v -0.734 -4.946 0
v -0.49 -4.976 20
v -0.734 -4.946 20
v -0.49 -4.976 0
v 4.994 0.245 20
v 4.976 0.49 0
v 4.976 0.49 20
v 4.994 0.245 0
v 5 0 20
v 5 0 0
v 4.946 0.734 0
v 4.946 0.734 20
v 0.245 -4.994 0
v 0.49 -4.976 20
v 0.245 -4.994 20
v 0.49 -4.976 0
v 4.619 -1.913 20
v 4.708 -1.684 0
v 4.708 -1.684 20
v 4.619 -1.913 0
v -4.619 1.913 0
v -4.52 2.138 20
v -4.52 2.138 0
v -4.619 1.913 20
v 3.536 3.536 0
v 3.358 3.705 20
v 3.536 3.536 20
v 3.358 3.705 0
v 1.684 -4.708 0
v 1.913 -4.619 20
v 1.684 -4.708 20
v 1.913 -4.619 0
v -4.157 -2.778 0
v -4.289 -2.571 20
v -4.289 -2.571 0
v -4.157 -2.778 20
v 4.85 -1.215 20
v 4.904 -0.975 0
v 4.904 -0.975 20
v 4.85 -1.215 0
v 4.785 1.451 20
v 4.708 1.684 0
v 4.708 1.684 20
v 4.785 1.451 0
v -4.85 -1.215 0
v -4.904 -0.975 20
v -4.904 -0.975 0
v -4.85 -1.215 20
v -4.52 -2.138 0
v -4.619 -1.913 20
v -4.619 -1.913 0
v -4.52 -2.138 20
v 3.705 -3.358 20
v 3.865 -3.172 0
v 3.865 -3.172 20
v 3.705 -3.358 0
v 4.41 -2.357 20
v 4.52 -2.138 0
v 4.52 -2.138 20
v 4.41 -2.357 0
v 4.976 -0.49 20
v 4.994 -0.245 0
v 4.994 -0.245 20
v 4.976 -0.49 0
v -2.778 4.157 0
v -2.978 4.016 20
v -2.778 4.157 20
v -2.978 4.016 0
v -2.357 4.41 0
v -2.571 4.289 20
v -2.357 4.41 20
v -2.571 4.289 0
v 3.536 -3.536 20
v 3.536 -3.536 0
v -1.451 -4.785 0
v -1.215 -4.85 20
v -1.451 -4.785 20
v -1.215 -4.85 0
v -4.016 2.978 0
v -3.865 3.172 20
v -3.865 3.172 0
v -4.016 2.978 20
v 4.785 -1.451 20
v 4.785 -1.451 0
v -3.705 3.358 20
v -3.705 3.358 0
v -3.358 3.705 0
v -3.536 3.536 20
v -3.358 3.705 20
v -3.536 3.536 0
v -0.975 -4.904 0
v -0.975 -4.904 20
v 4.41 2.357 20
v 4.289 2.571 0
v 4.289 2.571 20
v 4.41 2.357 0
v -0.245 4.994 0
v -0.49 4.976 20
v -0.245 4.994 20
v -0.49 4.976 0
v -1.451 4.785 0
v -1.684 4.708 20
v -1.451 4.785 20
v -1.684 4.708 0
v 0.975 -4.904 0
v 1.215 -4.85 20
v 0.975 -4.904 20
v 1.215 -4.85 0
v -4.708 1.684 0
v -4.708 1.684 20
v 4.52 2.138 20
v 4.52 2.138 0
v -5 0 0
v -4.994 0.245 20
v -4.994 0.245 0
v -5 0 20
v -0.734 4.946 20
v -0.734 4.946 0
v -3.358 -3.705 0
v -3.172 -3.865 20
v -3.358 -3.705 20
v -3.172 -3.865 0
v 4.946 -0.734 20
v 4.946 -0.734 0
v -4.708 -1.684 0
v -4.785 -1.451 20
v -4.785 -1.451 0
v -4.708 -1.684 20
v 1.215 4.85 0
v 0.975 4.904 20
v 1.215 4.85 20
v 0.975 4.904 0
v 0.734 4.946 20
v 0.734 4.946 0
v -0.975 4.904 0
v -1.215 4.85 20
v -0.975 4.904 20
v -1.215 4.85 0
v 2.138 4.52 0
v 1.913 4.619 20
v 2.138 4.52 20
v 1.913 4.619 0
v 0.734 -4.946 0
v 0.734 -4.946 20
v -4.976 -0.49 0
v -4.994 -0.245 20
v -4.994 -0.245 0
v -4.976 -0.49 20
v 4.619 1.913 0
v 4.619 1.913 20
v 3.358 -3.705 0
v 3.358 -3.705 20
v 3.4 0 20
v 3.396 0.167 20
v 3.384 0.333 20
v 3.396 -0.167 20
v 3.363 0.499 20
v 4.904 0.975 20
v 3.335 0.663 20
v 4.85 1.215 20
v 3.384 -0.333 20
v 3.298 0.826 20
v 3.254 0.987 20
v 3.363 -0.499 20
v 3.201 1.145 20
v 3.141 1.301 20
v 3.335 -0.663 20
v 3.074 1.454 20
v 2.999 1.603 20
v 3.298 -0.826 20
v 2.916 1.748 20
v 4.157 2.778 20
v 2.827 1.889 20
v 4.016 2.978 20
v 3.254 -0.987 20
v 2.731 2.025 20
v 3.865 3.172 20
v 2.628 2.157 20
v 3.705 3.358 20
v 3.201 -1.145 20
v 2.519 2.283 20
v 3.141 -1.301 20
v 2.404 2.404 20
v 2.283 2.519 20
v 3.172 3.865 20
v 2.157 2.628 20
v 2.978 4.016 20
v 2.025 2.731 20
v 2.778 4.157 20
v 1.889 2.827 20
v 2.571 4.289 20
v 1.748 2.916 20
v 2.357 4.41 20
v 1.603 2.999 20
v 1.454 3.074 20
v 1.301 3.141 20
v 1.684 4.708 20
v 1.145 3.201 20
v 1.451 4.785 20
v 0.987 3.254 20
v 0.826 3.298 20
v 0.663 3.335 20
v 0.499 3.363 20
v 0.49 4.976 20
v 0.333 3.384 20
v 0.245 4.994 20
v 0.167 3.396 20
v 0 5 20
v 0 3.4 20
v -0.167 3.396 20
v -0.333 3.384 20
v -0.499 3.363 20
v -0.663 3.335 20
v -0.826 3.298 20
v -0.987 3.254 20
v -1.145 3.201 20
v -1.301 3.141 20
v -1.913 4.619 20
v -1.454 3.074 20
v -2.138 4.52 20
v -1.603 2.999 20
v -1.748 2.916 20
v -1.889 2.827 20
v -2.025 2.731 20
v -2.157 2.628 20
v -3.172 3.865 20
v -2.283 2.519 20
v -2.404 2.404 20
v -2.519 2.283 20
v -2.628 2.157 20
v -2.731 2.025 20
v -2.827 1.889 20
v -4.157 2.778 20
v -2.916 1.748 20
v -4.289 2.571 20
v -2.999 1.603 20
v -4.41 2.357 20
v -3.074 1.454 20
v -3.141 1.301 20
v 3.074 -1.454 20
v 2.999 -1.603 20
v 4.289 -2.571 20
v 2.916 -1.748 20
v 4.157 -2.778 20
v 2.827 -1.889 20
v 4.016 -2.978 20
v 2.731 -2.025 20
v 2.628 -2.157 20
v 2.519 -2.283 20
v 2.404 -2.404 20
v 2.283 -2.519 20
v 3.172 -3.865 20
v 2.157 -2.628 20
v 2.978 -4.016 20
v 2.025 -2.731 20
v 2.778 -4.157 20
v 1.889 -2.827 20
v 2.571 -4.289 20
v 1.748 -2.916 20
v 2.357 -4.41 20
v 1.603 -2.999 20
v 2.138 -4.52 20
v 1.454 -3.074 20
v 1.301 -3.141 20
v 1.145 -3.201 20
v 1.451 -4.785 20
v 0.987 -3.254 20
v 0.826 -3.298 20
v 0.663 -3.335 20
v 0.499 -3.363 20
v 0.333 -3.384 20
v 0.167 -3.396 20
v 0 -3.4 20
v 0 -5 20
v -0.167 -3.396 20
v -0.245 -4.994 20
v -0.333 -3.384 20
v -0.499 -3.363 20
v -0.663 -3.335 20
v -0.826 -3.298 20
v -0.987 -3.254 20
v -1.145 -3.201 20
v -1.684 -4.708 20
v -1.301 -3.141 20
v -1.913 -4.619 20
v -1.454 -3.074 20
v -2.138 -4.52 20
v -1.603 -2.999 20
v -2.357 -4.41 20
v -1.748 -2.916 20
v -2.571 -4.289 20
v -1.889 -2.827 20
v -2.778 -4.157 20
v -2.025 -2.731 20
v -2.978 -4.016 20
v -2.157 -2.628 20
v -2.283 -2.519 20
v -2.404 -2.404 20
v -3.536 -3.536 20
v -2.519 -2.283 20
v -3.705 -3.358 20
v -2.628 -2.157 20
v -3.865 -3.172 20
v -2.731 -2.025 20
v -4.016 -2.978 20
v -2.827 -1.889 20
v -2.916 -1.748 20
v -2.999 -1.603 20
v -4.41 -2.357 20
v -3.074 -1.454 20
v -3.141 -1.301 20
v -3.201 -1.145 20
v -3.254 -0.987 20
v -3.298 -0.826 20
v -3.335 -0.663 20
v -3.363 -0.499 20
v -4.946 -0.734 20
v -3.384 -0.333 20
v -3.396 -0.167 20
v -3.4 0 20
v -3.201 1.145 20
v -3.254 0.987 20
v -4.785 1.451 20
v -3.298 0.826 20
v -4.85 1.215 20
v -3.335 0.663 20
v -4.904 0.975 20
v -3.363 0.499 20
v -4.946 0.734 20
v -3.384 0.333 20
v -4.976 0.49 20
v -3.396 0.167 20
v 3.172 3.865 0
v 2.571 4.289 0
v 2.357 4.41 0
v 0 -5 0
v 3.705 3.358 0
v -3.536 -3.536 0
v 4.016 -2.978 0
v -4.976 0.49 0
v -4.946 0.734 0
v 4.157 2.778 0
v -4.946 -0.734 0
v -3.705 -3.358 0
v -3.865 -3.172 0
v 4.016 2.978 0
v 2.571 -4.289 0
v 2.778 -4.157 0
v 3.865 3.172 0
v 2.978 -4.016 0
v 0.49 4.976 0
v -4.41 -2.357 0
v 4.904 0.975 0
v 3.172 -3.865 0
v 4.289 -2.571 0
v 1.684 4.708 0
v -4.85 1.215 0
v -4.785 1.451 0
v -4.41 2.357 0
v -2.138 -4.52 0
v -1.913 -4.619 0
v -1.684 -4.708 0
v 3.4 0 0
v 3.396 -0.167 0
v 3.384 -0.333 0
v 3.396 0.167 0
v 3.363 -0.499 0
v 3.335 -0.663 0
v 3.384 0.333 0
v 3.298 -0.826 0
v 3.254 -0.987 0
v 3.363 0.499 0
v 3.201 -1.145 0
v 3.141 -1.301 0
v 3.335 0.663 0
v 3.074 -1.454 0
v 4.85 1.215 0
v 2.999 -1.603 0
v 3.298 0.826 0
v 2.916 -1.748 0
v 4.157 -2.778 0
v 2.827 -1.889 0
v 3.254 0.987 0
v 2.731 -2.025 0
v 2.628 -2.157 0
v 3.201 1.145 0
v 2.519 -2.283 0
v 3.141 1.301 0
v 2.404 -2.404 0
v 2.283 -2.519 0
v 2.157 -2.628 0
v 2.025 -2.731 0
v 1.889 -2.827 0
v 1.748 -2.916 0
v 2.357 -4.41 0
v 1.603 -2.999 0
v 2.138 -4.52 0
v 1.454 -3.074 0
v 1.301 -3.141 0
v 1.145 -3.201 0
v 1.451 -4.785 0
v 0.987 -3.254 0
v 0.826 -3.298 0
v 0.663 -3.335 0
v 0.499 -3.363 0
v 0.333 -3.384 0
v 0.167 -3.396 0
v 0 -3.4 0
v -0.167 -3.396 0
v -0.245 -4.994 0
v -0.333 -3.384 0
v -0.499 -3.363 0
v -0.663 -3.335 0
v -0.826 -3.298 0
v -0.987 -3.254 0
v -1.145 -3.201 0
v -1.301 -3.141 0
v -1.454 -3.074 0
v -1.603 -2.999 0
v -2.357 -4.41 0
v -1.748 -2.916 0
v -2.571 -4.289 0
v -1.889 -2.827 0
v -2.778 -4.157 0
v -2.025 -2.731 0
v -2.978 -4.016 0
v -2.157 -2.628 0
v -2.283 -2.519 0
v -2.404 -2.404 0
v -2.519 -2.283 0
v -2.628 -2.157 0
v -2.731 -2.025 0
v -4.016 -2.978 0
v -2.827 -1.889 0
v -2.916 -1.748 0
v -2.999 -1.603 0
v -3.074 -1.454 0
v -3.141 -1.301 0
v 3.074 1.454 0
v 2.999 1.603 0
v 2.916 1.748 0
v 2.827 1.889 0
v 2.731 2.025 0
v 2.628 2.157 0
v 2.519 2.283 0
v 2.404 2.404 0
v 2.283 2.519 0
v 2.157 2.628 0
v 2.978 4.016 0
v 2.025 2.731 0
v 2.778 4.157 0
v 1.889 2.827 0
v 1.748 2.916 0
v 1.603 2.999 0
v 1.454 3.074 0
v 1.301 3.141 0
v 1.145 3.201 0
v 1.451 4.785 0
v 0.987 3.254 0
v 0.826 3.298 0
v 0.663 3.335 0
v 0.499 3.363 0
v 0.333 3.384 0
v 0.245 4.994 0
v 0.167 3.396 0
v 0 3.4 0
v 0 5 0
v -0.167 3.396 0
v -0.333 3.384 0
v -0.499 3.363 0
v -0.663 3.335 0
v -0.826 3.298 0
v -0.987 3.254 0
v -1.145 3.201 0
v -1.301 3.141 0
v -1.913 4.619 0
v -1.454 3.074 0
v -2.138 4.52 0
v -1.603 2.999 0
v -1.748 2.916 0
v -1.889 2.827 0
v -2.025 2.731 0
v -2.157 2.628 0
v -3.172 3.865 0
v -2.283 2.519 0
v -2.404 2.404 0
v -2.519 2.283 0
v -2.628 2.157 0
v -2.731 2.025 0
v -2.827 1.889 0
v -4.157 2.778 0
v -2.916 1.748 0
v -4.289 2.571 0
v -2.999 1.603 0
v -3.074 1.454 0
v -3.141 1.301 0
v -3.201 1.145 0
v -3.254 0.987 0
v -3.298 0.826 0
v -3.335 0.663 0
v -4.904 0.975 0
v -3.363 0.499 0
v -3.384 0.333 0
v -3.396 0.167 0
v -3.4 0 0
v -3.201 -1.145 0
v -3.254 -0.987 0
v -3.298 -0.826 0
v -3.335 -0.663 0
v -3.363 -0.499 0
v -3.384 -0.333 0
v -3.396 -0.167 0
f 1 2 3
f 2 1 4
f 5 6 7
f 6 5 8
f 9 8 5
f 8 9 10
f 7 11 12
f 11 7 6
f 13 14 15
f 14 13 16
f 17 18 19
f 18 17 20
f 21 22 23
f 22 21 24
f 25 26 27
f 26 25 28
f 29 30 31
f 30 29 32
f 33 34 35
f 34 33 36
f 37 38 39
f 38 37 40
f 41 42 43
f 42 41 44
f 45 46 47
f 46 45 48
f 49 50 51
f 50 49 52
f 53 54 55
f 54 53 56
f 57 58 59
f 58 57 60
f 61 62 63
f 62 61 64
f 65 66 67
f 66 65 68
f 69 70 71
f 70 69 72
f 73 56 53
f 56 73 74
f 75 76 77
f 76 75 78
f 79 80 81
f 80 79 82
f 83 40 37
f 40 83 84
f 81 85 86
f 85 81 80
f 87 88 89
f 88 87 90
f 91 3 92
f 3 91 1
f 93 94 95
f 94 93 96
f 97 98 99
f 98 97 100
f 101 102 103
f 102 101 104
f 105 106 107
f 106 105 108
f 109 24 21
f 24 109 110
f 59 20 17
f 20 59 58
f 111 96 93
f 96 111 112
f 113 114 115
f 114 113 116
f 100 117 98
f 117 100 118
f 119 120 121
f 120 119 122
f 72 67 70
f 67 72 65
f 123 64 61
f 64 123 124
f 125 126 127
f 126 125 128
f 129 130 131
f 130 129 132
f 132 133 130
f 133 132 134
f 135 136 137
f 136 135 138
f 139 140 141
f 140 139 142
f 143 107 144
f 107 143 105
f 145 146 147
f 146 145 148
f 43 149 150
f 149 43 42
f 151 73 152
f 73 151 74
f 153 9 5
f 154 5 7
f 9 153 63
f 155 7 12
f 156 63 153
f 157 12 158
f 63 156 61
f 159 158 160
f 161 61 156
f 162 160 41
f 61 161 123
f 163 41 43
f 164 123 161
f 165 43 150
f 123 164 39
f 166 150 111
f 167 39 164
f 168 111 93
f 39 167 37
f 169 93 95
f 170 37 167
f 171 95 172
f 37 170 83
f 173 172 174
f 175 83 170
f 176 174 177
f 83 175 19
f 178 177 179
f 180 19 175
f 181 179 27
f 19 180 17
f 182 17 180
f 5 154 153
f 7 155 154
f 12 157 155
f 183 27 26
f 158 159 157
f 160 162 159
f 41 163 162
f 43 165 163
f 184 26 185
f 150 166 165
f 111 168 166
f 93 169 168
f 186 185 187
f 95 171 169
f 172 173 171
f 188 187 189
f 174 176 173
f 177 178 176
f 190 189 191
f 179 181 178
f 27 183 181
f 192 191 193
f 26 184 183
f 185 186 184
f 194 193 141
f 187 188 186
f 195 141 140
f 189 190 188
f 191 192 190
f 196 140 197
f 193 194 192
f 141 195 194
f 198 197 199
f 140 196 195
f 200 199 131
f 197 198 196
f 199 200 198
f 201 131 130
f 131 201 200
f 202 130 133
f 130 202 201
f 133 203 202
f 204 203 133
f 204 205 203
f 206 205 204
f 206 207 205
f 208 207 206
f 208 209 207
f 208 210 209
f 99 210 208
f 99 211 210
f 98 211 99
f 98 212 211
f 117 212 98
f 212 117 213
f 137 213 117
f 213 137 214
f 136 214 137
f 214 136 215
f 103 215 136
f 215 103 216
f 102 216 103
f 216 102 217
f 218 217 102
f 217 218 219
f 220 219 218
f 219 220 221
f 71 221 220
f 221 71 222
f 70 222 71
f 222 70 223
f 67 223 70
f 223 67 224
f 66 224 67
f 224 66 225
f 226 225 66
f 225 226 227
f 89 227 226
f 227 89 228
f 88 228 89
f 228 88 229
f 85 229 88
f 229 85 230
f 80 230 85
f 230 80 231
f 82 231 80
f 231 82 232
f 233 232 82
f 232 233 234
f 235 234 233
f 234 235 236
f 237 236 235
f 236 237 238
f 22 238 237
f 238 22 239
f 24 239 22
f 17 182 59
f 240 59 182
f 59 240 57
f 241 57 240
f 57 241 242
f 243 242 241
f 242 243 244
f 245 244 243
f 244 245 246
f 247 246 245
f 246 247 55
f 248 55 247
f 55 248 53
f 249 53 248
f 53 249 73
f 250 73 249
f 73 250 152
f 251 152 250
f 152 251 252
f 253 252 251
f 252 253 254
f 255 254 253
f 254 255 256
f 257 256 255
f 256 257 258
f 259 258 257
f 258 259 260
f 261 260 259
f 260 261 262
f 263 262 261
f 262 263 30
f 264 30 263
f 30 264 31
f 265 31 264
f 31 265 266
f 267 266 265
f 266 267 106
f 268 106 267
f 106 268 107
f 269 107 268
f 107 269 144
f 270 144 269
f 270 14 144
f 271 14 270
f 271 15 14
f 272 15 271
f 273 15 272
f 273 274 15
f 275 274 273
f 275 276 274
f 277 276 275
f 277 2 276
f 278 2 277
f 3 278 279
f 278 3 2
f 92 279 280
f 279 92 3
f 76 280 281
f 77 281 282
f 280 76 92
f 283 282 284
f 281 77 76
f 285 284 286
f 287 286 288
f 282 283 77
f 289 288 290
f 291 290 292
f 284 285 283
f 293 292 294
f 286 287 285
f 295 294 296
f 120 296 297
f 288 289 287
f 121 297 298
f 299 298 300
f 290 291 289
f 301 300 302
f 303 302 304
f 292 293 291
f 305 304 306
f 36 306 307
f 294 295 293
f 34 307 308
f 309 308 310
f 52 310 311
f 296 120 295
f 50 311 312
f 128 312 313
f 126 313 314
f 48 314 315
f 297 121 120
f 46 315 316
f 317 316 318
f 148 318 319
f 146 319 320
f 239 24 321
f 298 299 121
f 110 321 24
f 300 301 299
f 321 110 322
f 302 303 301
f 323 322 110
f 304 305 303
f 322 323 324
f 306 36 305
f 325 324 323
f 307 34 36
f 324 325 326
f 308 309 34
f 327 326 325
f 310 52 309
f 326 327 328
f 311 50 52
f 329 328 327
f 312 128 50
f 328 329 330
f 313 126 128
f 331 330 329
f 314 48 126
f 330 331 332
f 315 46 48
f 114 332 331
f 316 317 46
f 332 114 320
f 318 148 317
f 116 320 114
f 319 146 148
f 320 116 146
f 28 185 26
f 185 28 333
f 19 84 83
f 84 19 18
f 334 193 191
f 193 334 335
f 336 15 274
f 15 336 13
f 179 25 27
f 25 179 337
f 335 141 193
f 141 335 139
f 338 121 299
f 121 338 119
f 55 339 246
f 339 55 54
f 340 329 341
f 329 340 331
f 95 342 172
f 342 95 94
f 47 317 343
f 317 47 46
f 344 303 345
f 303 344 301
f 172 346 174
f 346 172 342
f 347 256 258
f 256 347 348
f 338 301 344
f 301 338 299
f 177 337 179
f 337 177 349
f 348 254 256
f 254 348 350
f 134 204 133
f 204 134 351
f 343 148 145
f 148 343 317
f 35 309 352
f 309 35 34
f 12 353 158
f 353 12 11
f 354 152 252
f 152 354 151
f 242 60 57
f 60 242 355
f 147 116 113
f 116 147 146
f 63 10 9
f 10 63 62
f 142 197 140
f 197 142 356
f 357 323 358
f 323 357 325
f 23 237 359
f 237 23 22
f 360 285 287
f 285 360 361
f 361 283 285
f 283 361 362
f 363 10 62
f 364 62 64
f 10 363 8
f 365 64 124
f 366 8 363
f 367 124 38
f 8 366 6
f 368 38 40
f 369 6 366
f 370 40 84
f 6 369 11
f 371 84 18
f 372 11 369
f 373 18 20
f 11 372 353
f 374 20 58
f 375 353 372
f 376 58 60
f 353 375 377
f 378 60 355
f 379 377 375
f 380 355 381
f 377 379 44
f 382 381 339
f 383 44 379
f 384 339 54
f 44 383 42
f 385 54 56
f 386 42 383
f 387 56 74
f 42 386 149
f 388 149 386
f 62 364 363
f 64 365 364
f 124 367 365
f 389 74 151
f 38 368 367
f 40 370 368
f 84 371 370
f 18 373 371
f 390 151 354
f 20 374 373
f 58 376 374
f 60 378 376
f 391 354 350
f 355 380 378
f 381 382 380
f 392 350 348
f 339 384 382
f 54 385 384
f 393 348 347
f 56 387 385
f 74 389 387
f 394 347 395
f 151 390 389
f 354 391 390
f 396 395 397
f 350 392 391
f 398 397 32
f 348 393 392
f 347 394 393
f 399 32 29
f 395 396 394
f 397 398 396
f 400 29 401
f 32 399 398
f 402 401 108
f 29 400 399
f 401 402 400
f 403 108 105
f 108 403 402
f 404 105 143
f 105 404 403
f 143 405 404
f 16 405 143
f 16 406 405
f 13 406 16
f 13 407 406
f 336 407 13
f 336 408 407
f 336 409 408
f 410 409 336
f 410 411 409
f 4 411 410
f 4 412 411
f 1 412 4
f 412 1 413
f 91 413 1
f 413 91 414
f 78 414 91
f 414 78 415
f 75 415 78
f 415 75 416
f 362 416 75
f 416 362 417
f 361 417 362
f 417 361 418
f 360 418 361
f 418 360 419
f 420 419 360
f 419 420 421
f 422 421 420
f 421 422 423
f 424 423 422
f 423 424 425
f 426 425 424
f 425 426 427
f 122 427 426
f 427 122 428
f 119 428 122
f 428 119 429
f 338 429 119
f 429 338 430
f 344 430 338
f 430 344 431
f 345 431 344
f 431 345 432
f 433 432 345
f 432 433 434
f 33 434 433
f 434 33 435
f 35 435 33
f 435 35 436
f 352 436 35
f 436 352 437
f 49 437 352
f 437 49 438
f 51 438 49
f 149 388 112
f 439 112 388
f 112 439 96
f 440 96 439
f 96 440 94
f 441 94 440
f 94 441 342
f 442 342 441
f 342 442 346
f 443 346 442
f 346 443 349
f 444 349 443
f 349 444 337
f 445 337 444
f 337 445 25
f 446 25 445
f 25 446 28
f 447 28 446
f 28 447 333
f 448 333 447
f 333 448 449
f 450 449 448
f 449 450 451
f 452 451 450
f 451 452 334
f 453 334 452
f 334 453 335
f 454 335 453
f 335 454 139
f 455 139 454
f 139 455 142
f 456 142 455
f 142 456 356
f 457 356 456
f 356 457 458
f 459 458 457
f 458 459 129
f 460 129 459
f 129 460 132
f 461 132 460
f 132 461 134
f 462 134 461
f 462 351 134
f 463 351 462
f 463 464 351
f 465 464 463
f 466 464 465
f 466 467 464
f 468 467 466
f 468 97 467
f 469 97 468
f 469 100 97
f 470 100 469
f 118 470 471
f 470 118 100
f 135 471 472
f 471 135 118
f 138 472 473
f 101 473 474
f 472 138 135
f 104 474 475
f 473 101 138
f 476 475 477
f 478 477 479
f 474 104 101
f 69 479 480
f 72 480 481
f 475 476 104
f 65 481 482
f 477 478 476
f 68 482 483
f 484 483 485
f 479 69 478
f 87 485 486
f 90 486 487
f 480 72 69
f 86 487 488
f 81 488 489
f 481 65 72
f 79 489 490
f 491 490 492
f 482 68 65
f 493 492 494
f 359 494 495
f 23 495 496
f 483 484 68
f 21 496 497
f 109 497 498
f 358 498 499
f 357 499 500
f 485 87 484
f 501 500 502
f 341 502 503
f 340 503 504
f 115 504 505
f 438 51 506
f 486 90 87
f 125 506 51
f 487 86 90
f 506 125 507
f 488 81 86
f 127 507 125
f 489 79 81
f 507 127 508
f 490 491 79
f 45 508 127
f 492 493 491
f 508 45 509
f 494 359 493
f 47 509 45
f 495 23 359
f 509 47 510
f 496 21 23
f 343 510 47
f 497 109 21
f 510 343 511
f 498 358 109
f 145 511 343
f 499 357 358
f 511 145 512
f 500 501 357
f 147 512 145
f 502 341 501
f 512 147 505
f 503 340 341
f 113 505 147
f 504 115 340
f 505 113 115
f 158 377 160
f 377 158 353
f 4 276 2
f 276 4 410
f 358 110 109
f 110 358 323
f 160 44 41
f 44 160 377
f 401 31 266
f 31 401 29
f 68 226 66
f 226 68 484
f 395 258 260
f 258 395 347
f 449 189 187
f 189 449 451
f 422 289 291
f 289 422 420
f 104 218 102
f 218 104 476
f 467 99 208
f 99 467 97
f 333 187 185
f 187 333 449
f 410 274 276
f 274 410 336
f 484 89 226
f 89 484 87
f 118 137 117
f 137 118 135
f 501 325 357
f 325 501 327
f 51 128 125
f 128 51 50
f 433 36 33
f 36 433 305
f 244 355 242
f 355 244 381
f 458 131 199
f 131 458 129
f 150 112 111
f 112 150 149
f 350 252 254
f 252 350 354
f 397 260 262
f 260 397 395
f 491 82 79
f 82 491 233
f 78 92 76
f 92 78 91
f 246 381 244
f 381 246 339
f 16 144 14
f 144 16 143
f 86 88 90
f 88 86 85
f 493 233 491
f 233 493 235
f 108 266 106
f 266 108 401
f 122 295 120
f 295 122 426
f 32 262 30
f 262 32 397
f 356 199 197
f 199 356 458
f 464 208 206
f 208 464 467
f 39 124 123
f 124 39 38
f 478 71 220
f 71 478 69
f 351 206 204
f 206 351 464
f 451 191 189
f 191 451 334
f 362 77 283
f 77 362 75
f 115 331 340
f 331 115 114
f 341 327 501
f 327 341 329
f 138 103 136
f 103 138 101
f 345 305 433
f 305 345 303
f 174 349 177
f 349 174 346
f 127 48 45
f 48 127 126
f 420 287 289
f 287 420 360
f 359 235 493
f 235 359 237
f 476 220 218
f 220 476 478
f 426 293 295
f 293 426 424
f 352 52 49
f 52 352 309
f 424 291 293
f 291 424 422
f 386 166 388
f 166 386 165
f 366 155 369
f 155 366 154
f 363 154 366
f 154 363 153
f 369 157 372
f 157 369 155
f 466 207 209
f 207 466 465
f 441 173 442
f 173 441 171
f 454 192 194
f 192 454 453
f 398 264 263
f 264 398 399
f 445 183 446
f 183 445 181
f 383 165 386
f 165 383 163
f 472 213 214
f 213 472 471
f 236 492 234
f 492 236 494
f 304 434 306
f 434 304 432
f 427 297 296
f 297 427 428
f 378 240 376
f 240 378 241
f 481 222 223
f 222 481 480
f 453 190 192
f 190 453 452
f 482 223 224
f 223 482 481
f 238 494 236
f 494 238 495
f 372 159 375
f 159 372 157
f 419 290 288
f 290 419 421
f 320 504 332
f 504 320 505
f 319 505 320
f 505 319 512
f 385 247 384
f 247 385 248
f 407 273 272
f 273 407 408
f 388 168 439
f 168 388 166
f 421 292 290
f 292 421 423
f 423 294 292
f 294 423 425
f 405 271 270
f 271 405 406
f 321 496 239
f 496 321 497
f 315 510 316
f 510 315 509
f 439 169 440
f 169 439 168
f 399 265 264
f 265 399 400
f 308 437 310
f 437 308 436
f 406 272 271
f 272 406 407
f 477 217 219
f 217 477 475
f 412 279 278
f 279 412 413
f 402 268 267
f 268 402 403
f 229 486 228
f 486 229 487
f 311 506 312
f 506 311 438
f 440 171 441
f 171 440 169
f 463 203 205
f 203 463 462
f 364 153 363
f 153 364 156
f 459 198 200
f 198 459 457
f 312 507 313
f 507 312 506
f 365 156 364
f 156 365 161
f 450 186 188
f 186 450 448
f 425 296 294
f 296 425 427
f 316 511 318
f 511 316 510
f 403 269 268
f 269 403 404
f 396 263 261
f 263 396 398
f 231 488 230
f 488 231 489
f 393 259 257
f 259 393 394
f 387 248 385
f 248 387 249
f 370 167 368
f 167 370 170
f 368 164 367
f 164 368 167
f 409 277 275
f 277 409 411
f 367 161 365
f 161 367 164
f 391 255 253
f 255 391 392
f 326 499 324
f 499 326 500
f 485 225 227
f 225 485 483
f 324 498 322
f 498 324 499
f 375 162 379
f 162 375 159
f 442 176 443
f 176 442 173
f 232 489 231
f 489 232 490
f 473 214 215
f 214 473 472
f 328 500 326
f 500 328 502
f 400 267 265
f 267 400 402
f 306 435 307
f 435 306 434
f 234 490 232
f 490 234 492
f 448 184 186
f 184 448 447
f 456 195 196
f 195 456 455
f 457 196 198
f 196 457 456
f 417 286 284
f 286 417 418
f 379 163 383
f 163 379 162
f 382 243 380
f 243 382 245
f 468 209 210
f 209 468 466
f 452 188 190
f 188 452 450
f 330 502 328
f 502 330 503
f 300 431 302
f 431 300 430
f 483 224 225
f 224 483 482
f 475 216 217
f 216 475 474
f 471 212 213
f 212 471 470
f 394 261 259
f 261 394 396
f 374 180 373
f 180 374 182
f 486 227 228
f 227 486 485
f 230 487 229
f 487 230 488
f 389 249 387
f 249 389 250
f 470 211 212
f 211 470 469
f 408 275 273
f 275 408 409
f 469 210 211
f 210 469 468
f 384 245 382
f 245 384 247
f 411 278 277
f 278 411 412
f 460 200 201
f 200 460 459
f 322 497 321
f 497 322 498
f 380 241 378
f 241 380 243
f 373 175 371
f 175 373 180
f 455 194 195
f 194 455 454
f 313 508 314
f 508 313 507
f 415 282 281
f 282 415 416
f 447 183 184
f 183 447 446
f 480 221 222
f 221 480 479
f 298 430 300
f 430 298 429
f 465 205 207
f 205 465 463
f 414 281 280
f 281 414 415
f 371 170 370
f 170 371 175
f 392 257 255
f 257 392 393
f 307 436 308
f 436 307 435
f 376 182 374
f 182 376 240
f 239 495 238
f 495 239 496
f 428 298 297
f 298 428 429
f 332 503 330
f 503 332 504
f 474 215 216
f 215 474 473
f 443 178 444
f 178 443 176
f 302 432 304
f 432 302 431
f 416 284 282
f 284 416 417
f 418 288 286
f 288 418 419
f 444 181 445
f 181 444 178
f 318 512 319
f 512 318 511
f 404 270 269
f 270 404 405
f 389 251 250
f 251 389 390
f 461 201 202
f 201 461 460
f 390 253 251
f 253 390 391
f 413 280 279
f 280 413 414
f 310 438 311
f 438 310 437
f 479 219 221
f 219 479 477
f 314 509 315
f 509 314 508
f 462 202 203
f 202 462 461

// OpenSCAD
// Small lab funnel - printed upright, open top and bottom
// Units: mm. One complete part, no external libraries.

// ---- Parameters ----
spout_od      = 10;    // spout outer diameter
spout_length  = 20;    // spout runs from z = 0 to z = 20
cone_base_d   = 60;    // cone rim (base) outer diameter at z = 50
cone_top_d    = 10;    // cone outer diameter where it meets the spout (z = 20)
cone_height   = 30;    // cone runs from z = 20 to z = 50 (50 - 20)
wall          = 1.6;   // uniform wall thickness for spout and cone
eps           = 0.5;   // cutter overshoot past faces

$fn = 128;             // smoothness of curved surfaces

// ---- Derived ----
spout_id = spout_od - 2 * wall;   // spout bore diameter (6.8 mm)

// ---- Model ----
union() {
    // Straight spout: tube from z = 0 to z = 20
    difference() {
        cylinder(d = spout_od, h = spout_length);
        translate([0, 0, -eps])
            cylinder(d = spout_id, h = spout_length + 2 * eps);
    }

    // Cone: widens from 10 mm at z = 20 to 60 mm at z = 50
    rotate_extrude()
        translate([0, cone_top_d / 2, cone_height])
            difference() {
                circle(d = cone_base_d);
                translate([0, -eps])
                    circle(d = cone_base_d - 2 * wall);
            }
}
